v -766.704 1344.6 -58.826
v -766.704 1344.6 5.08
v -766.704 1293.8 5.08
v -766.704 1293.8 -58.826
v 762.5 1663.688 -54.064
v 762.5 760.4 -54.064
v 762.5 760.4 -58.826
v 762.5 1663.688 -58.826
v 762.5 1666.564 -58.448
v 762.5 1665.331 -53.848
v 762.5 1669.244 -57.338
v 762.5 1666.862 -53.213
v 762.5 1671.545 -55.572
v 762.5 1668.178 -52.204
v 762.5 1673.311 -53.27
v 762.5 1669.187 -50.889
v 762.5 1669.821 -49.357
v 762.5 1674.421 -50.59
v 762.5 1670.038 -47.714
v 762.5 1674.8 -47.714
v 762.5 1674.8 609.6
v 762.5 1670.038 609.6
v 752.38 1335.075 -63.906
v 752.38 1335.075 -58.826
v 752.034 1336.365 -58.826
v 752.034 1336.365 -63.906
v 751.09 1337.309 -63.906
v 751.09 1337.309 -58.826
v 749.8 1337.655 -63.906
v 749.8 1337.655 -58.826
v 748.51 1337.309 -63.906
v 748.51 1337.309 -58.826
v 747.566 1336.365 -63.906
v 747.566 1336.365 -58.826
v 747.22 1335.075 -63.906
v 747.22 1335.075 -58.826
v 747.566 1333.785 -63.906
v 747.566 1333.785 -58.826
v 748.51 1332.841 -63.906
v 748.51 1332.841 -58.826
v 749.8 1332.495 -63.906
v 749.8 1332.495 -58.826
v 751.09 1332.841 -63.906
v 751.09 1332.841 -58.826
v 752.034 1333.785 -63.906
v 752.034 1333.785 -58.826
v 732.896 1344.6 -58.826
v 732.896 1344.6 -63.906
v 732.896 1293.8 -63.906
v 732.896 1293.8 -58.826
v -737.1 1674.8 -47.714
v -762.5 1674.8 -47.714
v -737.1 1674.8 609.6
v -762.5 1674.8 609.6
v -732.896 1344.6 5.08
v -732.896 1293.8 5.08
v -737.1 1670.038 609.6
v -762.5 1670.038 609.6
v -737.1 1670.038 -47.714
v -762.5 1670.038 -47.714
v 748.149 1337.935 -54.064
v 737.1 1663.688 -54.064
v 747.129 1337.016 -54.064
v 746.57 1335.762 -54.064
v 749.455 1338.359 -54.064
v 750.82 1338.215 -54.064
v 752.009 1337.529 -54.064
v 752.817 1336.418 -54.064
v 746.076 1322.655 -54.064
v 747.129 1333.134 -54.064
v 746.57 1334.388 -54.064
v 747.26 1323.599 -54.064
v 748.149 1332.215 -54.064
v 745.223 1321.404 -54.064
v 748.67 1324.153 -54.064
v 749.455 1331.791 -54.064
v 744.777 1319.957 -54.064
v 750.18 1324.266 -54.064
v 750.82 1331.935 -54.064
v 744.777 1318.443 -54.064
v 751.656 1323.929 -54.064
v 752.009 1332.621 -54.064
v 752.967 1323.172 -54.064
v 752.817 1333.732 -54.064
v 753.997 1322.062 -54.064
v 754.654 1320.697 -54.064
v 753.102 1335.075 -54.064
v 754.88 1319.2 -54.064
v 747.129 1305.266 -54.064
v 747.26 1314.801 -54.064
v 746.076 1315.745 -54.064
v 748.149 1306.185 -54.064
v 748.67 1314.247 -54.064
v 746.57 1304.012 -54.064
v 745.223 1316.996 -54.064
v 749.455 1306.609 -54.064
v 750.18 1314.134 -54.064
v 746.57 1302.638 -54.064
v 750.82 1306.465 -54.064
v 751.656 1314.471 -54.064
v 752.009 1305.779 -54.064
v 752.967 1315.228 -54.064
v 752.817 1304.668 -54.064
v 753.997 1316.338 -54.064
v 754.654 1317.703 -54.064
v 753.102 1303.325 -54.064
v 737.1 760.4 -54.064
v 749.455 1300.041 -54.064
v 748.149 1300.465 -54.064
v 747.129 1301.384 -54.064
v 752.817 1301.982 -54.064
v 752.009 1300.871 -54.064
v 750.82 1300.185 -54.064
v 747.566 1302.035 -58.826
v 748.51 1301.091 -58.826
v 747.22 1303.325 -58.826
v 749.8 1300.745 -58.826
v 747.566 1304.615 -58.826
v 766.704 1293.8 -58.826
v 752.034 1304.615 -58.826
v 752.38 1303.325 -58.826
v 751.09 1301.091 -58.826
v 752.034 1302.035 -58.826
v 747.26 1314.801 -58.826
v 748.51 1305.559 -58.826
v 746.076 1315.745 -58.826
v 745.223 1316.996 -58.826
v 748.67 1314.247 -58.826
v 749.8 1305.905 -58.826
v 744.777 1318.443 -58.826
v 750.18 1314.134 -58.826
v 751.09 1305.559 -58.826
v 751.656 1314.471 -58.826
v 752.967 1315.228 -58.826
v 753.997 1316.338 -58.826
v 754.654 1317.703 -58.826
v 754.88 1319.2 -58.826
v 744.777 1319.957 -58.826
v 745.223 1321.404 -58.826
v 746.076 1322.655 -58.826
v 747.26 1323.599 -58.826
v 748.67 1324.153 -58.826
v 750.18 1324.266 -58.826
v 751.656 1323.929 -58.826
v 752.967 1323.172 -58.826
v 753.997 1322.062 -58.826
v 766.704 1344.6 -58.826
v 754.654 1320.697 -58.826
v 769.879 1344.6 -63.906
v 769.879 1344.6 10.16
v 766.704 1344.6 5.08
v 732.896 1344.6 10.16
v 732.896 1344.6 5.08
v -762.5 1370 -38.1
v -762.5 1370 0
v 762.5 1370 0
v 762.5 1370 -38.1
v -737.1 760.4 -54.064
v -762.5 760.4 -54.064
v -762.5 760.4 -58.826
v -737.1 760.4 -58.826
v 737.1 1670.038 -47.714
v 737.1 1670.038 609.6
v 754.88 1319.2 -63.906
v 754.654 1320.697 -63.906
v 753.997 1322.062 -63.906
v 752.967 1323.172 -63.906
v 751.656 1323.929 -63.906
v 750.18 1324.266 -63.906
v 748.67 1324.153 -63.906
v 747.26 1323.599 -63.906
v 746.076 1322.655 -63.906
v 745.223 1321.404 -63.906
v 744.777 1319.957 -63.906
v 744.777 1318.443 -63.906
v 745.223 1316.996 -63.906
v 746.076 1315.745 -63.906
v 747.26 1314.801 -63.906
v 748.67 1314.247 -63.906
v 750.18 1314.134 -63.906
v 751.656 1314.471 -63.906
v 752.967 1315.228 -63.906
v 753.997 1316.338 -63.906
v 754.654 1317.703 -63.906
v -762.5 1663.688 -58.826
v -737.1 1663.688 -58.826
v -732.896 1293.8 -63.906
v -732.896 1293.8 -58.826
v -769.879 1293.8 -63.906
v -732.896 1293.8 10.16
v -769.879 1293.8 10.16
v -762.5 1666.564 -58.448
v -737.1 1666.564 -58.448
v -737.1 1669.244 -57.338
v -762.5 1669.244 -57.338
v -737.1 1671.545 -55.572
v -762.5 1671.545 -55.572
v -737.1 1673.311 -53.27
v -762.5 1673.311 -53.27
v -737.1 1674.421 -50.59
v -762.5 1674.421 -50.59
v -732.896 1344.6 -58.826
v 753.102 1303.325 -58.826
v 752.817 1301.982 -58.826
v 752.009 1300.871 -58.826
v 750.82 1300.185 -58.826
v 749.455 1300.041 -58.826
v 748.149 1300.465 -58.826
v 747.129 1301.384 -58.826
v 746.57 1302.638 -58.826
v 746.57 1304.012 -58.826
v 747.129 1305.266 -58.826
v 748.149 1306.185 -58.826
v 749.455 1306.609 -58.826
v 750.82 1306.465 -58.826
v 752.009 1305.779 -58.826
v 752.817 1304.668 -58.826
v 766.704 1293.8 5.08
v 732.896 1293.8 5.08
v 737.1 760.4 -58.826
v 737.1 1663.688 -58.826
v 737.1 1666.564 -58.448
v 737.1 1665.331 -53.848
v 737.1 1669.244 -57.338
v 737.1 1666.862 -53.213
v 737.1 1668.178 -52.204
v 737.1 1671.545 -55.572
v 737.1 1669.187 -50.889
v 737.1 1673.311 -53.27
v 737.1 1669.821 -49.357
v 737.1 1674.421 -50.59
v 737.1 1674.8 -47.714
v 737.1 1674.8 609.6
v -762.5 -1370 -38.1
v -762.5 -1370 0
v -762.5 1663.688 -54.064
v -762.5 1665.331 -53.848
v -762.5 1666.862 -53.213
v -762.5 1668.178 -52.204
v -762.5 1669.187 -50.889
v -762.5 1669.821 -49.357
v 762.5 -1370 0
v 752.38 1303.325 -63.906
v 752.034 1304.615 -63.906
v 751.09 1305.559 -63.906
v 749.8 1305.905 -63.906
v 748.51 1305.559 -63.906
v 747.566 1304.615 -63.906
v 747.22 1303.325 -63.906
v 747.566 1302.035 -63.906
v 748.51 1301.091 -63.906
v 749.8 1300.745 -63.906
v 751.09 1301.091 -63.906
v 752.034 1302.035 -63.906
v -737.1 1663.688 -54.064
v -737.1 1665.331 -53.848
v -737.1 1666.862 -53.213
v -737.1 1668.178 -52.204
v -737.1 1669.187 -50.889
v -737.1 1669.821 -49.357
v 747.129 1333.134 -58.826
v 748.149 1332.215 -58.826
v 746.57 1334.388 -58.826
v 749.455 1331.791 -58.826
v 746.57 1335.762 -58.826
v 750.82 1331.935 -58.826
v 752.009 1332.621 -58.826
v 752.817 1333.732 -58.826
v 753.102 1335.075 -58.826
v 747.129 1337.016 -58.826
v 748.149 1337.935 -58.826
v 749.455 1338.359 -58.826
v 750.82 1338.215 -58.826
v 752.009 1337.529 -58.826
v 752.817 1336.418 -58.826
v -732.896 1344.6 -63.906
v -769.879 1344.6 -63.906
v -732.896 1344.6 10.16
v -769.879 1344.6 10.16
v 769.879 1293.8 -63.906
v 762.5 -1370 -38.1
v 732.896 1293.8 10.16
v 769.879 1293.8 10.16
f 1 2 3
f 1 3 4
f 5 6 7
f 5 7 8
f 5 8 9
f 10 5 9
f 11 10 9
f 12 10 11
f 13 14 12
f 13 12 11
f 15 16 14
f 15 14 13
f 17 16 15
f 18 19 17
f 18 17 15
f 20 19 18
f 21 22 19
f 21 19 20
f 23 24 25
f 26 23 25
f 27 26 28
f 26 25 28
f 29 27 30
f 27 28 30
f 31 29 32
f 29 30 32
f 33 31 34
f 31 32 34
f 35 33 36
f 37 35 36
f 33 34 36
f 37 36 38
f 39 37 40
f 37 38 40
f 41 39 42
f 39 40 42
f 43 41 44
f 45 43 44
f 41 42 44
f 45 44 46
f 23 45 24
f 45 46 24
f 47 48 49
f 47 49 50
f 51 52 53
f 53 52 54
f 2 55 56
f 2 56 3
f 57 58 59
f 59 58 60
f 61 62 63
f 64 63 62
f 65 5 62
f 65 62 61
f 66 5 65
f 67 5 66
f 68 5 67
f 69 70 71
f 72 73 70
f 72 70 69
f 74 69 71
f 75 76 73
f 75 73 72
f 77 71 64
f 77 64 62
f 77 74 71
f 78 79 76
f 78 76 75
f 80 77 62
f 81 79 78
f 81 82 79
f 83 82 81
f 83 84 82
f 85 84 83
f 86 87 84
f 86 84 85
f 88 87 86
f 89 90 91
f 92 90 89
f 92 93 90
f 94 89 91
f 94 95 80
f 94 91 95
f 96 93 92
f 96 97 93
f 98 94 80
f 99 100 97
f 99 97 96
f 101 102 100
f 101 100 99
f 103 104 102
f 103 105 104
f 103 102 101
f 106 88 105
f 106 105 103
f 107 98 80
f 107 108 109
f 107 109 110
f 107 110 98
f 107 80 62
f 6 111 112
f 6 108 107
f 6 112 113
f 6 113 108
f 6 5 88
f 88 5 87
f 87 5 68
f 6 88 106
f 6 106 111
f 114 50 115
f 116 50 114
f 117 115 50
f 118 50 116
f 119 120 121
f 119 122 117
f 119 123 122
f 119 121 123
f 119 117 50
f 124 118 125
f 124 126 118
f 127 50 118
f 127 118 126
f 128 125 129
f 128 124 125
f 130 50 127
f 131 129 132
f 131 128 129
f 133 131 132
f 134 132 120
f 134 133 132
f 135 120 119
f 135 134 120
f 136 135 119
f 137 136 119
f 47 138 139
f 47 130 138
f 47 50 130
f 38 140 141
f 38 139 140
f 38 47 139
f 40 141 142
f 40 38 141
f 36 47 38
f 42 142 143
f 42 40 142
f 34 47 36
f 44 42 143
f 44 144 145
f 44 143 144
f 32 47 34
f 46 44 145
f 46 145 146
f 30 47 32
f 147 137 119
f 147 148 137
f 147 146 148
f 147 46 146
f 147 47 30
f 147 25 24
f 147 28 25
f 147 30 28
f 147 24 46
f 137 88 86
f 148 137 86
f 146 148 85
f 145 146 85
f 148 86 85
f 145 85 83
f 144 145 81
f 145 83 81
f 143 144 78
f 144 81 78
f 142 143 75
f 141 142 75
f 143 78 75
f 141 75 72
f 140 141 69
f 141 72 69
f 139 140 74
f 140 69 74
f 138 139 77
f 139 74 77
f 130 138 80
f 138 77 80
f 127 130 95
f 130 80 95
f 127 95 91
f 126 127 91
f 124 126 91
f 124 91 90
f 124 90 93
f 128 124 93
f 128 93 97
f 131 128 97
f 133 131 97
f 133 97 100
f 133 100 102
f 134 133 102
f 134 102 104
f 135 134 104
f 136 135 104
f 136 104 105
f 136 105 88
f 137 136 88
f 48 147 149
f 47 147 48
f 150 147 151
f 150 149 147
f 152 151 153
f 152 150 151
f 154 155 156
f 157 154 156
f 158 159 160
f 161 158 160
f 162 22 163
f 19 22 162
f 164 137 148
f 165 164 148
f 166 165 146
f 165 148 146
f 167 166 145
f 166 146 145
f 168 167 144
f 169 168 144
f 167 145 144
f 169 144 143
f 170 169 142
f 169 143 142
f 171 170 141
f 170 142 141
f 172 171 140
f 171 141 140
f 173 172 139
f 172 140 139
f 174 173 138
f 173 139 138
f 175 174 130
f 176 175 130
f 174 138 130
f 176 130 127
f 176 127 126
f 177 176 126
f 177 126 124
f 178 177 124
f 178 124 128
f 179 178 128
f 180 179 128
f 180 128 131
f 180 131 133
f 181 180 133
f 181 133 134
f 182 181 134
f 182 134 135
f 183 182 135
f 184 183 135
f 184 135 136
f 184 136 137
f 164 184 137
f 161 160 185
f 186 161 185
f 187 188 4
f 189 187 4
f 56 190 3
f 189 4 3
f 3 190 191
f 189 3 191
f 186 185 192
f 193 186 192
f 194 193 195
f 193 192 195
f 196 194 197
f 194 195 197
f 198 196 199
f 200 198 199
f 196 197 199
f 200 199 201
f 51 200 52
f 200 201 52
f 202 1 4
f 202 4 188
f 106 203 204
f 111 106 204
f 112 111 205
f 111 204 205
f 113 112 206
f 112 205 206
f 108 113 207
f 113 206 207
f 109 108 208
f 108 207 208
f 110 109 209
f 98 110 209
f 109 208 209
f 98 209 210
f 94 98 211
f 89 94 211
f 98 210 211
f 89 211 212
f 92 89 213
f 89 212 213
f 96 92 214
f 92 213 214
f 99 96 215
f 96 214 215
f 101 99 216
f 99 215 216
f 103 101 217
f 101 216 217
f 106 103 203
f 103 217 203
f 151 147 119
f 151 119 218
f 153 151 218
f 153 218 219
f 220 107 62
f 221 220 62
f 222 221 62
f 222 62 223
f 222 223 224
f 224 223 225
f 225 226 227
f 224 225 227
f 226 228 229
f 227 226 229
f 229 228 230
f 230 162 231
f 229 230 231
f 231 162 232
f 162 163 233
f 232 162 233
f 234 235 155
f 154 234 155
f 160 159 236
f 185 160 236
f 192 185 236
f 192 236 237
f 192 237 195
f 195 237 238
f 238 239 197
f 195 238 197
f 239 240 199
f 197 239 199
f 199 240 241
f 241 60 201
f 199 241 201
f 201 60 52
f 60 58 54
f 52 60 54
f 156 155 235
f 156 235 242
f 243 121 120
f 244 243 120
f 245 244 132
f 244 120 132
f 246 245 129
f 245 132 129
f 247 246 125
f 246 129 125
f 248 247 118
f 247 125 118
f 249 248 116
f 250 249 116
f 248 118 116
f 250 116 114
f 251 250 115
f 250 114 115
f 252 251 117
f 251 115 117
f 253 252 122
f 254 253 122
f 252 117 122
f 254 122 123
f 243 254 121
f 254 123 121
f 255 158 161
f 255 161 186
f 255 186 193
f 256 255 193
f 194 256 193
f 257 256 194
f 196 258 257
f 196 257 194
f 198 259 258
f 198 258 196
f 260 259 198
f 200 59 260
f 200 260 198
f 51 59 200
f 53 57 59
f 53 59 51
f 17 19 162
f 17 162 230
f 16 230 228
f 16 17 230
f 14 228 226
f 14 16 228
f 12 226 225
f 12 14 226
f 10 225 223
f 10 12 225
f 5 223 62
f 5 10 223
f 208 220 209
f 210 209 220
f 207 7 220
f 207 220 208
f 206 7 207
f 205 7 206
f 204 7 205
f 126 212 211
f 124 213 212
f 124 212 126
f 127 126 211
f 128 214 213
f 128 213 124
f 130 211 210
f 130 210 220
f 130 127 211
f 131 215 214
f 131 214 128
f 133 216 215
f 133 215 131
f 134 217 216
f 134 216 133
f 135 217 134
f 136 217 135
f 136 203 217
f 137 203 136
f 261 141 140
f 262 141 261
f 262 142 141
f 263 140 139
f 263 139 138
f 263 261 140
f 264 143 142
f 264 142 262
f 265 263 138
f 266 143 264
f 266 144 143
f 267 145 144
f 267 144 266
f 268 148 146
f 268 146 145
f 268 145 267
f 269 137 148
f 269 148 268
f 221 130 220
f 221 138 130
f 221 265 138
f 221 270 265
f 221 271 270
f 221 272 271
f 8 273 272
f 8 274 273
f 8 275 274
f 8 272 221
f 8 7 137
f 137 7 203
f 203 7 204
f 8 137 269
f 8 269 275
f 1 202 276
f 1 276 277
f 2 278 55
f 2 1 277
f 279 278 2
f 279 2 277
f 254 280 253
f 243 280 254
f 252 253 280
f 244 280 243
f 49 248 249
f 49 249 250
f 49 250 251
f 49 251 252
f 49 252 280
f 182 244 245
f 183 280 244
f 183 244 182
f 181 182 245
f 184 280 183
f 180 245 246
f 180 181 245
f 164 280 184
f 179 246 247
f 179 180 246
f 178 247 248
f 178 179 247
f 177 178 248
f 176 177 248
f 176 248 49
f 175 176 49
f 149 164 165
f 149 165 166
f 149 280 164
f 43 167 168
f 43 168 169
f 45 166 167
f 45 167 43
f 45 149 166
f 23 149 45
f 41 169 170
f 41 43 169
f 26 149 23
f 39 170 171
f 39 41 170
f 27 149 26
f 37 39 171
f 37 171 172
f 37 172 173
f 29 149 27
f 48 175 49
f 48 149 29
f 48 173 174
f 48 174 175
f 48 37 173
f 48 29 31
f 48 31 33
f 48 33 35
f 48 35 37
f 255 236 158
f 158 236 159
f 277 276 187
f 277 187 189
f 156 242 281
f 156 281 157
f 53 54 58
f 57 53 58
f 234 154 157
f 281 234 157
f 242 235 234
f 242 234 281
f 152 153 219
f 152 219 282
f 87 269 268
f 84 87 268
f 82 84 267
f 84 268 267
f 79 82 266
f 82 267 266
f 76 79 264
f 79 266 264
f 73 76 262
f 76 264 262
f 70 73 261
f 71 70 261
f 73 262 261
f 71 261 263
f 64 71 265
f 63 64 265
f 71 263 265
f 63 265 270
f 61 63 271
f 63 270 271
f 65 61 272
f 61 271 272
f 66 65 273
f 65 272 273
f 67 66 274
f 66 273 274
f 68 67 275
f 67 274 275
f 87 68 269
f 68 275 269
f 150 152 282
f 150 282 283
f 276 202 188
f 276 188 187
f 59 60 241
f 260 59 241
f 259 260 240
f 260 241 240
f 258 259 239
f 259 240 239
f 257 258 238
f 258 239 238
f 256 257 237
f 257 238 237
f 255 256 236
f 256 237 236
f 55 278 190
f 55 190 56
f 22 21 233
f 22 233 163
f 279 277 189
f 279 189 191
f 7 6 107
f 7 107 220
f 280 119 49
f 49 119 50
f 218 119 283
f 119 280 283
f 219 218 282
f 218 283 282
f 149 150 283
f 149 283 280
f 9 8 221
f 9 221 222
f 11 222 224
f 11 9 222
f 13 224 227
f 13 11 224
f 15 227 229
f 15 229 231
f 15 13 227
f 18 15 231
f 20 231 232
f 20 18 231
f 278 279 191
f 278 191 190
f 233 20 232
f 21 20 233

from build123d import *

# Parameters (mm, degrees)
F0_W      = 1525
F0_H      = 2740
F1_DEPTH  = 38.1
F5_DEPTH  = 25.4
F9_DEPTH  = 50.8
F10_R     = 2.5796875
F10_R_2   = 5.08
F11_DEPTH = 9.8435
F12_R     = 3.302
F12_R_2   = 5.08
F13_DEPTH = 668.4274


with BuildPart() as f1:
    # F0 (on Top) → F1 (new body)
    with BuildSketch(Plane.XY):
        Rectangle(F0_W, F0_H)
    extrude(amount=-F1_DEPTH)


with BuildPart() as f5:
    # F4 (on offset) → F5 (new body)
    with BuildSketch(Plane.YZ.offset(762.5)):
        with BuildLine():
            Line((1663.6875, -54.0639), (760.4, -54.0639))
            Line((760.4, -54.0639), (760.4, -58.8264))
            Line((760.4, -58.8264), (1663.6875, -58.8264))
            ThreePointArc((1663.6875, -58.8264), (1671.5452241059, -55.5716241059), (1674.8, -47.7139))
            Line((1674.8, -47.7139), (1674.8, 609.6))
            Line((1674.8, 609.6), (1670.0375, 609.6))
            Line((1670.0375, 609.6), (1670.0375, -47.7139))
            ThreePointArc((1670.0375, -47.7139), (1668.1776280605, -52.2040280605), (1663.6875, -54.0639))
        make_face()
    extrude(amount=-F5_DEPTH)


with BuildPart() as f6_1:
    # F6: instance of F5
    add(f5.part.mirror(Plane.YZ))


with BuildPart() as f9:
    # F8 (on offset) → F9 (new body)
    with BuildSketch(Plane(origin=(0, 1344.6, 0), x_dir=(-1, 0, 0), z_dir=(0, 1, 0))):
        Polygon((-766.7037, 5.08), (-732.8963, 5.08), (-732.8963, 10.16), (-769.8787, 10.16), (-769.8787, -63.9064), (-732.8963, -63.9064), (-732.8963, -58.8264), (-766.7037, -58.8264), align=None)
    extrude(amount=-F9_DEPTH)


with BuildPart() as f9b:
    # F8 (on offset) → F9, piece 2 (new body)
    with BuildSketch(Plane(origin=(0, 1344.6, 0), x_dir=(-1, 0, 0), z_dir=(0, 1, 0))):
        Polygon((766.7037, -58.8264), (732.8963, -58.8264), (732.8963, -63.9064), (769.8787, -63.9064), (769.8787, 10.16), (732.8963, 10.16), (732.8963, 5.08), (766.7037, 5.08), align=None)
    extrude(amount=-F9_DEPTH)


with BuildPart() as f11_tool:
    # F10 (on face) → F11 (new body, through all)
    with BuildSketch(Plane.XY.offset(-54.0639)):
        with Locations((749.8, 1335.075)):
            Circle(F10_R)
        with Locations((749.8, 1303.325)):
            Circle(F10_R)
        with Locations((749.8, 1319.2)):
            Circle(F10_R_2)
    extrude(amount=-F11_DEPTH)


with BuildPart() as f5_1:
    add(f5.part)

    # F11: cut by f11_tool
    add(f11_tool.part, mode=Mode.SUBTRACT)

    # F12 (on face) → F13 (cut, through all)
    with BuildSketch(Plane(origin=(0, 0, -58.8264), x_dir=(1, 0, 0), z_dir=(0, 0, -1))):
        with Locations((749.8, -1335.075)):
            Circle(F12_R)
        with Locations((749.8, -1303.325)):
            Circle(F12_R)
        with Locations((749.8, -1319.2)):
            Circle(F12_R_2)
    extrude(amount=-F13_DEPTH, mode=Mode.SUBTRACT)


with BuildPart() as f9_1:
    add(f9.part)

    # F11: cut by f11_tool
    add(f11_tool.part, mode=Mode.SUBTRACT)


solid = Compound([f1.part, f6_1.part, f9b.part, f5_1.part, f9_1.part])
